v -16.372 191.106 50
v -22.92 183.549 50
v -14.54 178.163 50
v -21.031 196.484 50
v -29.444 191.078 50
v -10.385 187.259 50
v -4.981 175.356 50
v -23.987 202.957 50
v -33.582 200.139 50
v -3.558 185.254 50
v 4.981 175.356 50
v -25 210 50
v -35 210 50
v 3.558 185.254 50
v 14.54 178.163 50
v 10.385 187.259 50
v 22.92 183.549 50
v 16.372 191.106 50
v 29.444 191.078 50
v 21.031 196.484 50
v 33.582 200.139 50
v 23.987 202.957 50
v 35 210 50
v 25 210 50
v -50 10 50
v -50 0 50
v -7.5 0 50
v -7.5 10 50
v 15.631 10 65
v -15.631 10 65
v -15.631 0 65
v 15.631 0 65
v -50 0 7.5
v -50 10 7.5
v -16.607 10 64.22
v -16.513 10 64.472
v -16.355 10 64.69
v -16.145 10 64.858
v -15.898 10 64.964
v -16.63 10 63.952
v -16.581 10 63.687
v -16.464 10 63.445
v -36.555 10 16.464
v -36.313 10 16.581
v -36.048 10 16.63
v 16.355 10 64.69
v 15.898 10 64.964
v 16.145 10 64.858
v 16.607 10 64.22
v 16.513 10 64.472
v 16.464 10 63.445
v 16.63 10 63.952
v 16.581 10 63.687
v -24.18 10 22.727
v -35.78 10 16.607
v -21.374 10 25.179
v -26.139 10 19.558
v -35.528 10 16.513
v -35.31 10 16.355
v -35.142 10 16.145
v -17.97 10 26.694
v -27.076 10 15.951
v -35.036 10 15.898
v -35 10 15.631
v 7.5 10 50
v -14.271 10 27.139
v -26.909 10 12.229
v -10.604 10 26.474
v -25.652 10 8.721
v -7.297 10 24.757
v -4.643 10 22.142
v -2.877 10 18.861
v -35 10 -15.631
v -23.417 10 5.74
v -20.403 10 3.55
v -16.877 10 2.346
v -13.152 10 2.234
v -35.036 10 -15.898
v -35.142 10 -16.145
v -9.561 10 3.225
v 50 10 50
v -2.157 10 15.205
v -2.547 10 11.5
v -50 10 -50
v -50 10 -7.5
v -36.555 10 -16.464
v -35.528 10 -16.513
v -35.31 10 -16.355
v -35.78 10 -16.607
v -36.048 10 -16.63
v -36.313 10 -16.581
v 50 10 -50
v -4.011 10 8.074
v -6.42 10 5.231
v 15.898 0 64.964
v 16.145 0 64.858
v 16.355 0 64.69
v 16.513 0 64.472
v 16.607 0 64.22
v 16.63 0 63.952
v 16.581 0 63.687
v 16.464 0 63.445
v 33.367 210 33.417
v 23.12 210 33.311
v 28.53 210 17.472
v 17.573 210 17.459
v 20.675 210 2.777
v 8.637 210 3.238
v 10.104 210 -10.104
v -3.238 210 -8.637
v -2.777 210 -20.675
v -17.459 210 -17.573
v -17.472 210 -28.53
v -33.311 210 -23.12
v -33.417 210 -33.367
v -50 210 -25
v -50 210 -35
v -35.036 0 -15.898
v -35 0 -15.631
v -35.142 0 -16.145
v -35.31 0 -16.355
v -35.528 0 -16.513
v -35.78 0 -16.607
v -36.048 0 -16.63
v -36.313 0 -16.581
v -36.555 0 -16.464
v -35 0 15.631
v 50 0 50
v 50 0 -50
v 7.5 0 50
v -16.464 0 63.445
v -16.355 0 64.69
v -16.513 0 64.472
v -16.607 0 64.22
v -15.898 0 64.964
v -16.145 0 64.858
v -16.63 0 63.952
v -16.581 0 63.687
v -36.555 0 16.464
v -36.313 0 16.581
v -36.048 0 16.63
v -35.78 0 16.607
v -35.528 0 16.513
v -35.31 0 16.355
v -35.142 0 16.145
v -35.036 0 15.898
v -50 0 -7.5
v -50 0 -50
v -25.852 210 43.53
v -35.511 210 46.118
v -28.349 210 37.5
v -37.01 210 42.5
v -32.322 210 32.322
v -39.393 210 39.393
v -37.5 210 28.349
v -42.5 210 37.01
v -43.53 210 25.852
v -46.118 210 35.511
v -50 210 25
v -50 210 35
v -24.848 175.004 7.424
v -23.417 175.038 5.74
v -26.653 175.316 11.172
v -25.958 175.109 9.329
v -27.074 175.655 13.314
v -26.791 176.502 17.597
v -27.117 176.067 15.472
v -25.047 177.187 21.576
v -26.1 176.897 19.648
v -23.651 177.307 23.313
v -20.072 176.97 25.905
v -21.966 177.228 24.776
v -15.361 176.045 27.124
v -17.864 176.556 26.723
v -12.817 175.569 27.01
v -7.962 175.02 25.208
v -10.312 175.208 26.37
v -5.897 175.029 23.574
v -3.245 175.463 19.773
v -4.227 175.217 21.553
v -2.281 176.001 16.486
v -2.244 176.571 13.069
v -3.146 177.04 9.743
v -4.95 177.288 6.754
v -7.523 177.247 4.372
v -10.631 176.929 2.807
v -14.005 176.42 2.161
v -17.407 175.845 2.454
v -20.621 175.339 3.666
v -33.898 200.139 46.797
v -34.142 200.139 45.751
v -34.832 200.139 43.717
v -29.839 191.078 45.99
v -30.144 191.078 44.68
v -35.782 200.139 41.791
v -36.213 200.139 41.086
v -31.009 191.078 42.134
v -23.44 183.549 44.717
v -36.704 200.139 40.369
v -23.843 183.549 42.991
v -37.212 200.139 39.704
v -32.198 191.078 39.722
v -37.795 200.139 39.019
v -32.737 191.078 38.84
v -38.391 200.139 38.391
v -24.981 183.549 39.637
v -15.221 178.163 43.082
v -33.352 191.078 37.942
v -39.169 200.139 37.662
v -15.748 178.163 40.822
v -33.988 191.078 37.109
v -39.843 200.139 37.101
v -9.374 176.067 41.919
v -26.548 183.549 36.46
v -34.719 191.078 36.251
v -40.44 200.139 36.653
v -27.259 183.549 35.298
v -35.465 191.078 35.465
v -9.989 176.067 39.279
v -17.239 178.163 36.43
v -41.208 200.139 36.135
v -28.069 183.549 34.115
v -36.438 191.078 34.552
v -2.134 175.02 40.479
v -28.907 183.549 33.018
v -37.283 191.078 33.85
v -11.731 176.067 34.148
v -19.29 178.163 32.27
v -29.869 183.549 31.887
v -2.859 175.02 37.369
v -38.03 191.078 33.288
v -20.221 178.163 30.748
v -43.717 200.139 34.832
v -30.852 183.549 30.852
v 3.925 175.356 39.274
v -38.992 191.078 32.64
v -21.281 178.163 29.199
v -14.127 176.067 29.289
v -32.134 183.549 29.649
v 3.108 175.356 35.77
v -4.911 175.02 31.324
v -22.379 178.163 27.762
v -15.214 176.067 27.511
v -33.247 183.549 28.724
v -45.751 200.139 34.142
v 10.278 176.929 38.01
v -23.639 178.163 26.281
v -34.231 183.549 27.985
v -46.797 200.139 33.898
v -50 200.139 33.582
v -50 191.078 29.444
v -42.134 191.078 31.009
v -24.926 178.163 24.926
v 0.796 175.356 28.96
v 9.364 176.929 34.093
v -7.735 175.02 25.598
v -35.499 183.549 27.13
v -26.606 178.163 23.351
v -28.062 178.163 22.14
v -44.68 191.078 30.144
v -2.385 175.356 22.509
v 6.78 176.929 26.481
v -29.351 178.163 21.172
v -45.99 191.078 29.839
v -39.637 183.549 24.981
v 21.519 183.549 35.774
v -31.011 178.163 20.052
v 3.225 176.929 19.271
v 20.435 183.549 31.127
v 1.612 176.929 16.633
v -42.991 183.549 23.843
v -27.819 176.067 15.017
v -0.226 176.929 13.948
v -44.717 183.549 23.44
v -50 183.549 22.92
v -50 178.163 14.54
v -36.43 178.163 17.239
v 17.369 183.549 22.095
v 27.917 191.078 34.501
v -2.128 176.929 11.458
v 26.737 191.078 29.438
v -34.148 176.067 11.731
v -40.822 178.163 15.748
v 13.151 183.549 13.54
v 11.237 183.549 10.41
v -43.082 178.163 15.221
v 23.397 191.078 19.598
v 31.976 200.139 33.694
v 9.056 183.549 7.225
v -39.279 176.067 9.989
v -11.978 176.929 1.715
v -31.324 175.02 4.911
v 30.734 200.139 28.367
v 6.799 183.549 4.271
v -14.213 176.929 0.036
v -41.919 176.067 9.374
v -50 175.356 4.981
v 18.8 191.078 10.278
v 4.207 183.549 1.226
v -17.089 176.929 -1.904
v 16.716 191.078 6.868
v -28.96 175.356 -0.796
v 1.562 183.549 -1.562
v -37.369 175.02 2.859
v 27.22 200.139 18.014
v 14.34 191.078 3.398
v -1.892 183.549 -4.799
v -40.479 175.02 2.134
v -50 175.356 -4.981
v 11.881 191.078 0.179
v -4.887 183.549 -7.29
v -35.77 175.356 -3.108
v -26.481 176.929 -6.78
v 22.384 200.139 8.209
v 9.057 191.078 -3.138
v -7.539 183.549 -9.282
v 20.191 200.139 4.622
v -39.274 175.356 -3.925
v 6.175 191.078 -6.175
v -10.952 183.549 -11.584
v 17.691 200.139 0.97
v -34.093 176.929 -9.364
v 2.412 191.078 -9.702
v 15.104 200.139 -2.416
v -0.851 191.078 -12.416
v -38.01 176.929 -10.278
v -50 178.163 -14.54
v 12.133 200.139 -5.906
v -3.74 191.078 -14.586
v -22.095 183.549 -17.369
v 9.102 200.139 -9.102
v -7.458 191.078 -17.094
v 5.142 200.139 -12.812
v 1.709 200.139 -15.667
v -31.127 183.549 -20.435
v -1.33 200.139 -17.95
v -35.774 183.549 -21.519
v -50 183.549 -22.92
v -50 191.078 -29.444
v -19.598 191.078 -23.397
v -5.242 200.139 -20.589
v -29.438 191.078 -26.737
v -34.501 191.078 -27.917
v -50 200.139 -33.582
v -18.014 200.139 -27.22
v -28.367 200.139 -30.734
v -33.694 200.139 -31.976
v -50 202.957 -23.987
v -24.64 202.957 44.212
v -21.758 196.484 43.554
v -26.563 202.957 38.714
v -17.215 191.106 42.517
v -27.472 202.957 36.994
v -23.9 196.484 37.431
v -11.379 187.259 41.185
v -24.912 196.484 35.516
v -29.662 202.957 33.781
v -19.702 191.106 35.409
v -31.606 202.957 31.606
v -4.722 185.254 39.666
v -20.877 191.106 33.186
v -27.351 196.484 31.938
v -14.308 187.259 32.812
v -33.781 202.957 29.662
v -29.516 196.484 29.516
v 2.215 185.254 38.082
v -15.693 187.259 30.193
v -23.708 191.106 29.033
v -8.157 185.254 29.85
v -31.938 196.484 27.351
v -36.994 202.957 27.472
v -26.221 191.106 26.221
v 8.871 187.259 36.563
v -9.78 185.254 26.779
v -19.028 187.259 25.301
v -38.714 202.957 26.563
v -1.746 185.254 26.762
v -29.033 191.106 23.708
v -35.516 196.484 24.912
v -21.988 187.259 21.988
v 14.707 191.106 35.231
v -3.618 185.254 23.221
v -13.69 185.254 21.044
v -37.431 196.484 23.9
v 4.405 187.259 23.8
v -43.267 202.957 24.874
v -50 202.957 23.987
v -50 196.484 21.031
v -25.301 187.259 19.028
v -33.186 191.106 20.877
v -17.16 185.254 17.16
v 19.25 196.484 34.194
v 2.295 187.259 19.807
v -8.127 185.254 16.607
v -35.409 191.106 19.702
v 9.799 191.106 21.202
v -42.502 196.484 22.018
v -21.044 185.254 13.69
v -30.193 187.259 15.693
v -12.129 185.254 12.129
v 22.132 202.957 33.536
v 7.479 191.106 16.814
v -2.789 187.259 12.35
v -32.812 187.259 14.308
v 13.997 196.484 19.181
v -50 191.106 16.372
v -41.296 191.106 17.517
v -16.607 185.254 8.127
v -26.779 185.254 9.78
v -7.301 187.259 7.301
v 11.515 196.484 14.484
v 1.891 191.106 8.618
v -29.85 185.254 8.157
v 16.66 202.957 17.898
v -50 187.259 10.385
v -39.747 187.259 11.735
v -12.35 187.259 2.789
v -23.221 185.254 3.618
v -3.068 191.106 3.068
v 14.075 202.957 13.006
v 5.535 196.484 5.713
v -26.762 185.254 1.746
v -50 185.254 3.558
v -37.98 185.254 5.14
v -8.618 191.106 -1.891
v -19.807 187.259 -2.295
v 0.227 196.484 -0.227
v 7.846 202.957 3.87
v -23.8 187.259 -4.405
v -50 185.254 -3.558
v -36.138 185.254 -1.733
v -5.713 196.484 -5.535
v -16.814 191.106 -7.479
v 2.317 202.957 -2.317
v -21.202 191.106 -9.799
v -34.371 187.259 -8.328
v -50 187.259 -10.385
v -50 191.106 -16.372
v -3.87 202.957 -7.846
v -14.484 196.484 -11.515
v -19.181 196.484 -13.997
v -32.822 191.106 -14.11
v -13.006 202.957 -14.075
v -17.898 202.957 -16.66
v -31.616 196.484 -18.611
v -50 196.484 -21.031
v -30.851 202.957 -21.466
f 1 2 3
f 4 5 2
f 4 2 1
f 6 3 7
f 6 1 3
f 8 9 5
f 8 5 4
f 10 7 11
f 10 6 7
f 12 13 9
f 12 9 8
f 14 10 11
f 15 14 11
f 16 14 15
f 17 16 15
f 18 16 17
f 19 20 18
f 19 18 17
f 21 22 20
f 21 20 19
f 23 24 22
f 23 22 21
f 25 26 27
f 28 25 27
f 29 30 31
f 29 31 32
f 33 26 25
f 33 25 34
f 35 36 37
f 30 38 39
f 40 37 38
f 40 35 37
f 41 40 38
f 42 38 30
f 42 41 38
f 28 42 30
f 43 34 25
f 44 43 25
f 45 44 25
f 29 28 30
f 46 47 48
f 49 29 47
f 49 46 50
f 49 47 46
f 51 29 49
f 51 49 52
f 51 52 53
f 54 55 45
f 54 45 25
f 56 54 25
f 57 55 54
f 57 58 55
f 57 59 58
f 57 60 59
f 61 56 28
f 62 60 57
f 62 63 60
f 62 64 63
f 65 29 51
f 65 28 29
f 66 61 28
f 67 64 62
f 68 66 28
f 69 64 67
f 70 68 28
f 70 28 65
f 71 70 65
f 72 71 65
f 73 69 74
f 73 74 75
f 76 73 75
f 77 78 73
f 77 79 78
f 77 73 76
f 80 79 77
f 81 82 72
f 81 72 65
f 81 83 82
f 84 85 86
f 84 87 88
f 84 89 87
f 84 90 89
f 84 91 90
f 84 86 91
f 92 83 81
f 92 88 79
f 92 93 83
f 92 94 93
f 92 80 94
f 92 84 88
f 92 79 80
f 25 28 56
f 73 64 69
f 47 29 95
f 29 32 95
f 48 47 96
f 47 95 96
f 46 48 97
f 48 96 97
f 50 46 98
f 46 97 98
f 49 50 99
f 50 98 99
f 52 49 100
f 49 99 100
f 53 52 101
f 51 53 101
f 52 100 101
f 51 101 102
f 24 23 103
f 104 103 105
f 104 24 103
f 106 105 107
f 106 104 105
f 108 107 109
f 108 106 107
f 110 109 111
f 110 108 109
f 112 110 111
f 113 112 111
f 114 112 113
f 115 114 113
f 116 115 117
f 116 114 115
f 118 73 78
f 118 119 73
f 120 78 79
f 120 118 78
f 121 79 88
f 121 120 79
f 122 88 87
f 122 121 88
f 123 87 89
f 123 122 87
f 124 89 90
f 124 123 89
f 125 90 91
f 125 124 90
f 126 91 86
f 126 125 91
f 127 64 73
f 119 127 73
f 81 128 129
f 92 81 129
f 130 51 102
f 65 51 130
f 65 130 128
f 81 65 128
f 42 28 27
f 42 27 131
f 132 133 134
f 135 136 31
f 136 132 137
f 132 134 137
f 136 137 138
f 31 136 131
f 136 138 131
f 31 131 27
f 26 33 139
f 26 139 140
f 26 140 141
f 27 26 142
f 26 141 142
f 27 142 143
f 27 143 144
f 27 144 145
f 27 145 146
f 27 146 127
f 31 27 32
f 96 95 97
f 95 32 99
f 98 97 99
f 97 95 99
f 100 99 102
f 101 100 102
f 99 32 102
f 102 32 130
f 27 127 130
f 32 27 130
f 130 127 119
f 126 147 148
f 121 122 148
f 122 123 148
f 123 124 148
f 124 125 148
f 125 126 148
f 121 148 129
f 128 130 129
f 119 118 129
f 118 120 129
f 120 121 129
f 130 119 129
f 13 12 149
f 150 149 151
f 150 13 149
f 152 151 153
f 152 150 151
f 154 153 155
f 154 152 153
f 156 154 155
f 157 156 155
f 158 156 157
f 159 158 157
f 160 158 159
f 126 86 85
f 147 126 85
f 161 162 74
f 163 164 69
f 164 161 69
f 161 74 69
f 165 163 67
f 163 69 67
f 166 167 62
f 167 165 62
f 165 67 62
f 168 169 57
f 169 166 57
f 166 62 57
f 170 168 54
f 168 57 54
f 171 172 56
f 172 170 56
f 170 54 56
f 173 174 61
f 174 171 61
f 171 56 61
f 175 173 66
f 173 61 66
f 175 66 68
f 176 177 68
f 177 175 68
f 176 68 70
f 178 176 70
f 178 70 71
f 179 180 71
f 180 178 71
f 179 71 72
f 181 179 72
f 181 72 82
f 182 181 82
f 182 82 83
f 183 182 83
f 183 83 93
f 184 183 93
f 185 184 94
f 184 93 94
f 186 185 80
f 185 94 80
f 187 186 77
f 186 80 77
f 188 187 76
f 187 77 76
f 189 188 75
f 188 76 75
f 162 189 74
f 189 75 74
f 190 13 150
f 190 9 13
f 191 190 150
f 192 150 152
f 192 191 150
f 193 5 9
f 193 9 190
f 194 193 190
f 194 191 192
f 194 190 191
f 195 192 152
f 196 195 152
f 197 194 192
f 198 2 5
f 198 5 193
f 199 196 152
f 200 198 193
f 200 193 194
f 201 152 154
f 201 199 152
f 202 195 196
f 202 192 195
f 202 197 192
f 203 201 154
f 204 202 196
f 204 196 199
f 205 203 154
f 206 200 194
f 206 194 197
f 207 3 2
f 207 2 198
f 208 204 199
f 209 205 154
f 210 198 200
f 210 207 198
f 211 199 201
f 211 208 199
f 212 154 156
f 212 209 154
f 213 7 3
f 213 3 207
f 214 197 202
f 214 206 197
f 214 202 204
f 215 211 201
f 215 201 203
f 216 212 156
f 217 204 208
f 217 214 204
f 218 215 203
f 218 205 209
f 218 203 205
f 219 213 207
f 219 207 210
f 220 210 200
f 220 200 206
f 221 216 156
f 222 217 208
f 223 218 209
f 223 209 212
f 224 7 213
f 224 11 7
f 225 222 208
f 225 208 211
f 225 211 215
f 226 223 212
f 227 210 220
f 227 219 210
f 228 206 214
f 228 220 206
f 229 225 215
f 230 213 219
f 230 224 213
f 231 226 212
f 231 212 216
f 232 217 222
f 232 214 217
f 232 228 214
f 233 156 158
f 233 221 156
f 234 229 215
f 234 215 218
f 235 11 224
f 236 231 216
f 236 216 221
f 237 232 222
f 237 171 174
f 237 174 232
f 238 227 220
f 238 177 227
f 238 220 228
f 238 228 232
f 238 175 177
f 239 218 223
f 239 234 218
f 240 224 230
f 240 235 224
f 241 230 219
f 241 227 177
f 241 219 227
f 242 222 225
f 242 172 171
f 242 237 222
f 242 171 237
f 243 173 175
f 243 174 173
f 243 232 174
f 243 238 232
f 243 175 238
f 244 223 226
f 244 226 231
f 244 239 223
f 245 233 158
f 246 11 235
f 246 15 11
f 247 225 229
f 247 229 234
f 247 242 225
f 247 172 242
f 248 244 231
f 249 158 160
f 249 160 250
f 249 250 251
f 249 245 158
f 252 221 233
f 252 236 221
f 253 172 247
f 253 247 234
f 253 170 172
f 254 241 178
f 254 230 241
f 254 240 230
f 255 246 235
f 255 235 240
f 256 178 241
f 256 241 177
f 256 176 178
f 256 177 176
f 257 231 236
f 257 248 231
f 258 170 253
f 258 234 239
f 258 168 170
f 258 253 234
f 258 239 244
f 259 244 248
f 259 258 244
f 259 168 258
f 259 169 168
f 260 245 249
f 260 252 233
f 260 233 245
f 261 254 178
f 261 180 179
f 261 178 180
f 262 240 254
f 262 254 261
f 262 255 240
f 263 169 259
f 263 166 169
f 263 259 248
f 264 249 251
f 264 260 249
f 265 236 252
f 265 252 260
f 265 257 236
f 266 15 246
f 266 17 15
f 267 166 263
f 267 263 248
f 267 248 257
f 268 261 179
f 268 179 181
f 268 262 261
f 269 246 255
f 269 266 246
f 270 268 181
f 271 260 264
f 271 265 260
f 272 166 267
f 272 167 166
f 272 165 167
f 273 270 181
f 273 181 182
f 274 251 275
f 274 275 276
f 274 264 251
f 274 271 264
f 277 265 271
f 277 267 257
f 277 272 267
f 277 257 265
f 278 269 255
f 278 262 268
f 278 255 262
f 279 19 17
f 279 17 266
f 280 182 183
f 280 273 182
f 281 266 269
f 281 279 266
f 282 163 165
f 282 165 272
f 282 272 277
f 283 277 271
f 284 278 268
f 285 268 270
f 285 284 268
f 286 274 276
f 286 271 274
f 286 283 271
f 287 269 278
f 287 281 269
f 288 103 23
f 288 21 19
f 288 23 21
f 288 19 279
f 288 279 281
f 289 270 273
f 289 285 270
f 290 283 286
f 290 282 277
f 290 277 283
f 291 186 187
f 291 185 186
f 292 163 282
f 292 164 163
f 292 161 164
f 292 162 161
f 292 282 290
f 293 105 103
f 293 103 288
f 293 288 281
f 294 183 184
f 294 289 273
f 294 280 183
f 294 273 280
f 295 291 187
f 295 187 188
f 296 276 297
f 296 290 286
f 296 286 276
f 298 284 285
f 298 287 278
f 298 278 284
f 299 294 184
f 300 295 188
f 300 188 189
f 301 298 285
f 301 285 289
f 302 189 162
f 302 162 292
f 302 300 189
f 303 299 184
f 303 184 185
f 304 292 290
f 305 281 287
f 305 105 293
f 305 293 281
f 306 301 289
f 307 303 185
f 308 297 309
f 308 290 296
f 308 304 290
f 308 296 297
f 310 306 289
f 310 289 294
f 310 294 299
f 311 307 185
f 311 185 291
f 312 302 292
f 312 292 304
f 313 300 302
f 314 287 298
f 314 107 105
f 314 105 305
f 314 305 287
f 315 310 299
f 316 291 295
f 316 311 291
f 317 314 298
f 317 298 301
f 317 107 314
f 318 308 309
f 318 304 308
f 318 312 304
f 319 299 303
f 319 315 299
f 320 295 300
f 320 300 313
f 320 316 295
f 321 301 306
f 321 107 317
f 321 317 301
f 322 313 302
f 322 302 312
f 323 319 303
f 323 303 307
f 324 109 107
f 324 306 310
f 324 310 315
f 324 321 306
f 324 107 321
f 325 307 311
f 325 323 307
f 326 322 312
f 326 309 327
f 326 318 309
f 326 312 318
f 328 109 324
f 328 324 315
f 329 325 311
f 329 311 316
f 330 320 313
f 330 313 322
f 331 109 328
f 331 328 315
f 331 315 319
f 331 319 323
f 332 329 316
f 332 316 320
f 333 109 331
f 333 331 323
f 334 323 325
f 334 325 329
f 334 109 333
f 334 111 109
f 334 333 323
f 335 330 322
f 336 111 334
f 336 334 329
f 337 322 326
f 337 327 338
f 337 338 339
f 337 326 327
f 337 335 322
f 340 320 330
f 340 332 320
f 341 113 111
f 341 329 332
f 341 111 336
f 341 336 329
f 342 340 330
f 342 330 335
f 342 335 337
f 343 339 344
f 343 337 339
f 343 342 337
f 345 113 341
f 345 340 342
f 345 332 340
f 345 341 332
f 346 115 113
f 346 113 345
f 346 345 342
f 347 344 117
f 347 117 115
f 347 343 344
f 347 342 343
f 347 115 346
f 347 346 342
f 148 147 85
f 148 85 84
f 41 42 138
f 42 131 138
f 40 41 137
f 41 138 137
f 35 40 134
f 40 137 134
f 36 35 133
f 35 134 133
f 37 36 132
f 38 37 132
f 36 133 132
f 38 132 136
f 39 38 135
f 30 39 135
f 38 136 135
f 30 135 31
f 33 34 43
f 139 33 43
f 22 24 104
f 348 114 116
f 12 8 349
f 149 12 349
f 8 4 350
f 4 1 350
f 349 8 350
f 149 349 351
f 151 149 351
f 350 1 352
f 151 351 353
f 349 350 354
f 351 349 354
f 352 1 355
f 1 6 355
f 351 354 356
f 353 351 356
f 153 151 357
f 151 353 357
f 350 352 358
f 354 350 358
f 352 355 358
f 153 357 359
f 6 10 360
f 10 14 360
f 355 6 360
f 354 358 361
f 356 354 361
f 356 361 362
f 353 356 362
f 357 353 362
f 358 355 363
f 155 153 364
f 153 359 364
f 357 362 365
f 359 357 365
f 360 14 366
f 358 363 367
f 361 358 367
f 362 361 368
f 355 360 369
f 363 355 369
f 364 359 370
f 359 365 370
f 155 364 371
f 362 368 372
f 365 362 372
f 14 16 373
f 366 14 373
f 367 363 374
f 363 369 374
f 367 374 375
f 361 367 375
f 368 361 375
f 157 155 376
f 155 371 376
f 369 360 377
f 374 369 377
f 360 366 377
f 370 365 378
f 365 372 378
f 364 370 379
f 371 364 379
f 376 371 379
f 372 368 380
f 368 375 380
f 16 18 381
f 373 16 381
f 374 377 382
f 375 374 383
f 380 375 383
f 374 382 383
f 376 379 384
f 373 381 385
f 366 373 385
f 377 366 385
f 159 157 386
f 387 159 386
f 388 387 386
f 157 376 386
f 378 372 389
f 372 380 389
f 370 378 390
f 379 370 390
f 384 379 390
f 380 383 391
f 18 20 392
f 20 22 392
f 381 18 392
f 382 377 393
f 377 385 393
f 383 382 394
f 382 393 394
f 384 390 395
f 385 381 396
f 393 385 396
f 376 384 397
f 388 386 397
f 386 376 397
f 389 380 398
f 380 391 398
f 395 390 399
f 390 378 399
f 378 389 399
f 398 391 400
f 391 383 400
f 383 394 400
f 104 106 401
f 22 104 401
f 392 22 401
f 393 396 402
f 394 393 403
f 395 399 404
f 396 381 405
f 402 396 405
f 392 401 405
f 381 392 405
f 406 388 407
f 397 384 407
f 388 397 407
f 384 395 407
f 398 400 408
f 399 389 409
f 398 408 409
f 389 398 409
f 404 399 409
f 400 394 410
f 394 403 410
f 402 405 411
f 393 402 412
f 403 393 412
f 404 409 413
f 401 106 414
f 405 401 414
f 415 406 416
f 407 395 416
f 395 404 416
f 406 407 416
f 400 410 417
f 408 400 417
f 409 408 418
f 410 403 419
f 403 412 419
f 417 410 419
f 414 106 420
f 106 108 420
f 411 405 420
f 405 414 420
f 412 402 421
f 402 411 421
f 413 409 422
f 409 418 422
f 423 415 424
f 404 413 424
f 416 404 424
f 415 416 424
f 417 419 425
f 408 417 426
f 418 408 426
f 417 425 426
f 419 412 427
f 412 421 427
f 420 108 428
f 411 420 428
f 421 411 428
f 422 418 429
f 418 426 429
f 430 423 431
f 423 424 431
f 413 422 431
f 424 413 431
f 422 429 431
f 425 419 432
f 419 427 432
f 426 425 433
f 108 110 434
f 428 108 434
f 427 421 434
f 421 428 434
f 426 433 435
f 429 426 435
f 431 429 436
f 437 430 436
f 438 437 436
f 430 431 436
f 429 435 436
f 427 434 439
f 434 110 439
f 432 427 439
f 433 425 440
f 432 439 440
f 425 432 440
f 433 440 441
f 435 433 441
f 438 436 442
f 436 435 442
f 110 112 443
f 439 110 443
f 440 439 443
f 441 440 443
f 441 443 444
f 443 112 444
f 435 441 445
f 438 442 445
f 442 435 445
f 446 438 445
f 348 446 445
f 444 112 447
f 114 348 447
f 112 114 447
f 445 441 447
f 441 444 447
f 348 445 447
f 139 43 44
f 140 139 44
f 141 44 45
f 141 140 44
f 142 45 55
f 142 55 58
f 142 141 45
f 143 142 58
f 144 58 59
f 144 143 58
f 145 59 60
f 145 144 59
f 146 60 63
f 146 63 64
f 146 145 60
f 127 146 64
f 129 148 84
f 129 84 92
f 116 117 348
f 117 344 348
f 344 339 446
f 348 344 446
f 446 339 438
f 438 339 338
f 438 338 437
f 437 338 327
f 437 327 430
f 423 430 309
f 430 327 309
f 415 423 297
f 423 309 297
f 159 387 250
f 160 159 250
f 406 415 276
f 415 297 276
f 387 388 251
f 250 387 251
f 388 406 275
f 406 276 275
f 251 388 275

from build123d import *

# Parameters (mm, degrees)
SKETCH1_W                      = 100
SKETCH1_H                      = 100
BOSS_EXTRUDE1_DEPTH            = 10
BOSS_EXTRUDE2_REACH            = 214.132
BOSS_EXTRUDE2_END_MAJOR_RADIUS = 50
BOSS_EXTRUDE2_END_MINOR_RADIUS = 35
SKETCH4_R                      = 12.5
BOSS_EXTRUDE21_DEPTH           = 10
FILLET1_R                      = 1
CUT_EXTRUDE1_REACH             = 230.031
FILLET11_R                     = 1


with BuildPart() as part:
    # Sketch1 → Boss-Extrude1 (new body)
    with BuildSketch(Plane(origin=(0, 0, 0), x_dir=(1, 0, 0), z_dir=(0, 1, 0))):
        Rectangle(SKETCH1_W, SKETCH1_H)
    extrude(amount=BOSS_EXTRUDE1_DEPTH)



with BuildPart() as body_2:
    # Sweep1: sweep along a path in Sketch2
    with BuildLine(Plane(origin=(0, 210, 0), x_dir=(1, 0, 0), z_dir=(0, 1, 0))) as sweep1_path:
        ThreePointArc((0, -50), (-14.644660941, -14.644660941), (-50, 0))
    # Sketch3 → Sweep1 (sweep)
    with BuildSketch(Plane.XY.offset(50)):
        with BuildLine():
            Line((25, 210), (35, 210))
            ThreePointArc((35, 210), (0, 175), (-35, 210))
            Line((-35, 210), (-25, 210))
            ThreePointArc((-25, 210), (0, 185), (25, 210))
        make_face()
    sweep(path=sweep1_path.line)


with BuildPart() as part_1:
    add(part.part)

    add(body_2.part)  # Boss-Extrude2 merges body 2
    # Boss-Extrude2: up to this torus (the profile starts outside it)
    boss_extrude2_end = Plane(origin=(-50, 210, 50), z_dir=(0, 1, 0)) * Torus(BOSS_EXTRUDE2_END_MAJOR_RADIUS, BOSS_EXTRUDE2_END_MINOR_RADIUS, mode=Mode.PRIVATE)
    # Sketch4 → Boss-Extrude2 (add, up to the surface)
    with BuildSketch(Plane(origin=(0, 10, 0), x_dir=(1, 0, 0), z_dir=(0, 1, 0)), mode=Mode.PRIVATE) as boss_extrude2_sk1:
        with Locations(Location((-14.644660941, -14.644660941, 0), (0, 0, 134.571678601))):
            Circle(SKETCH4_R)
    boss_extrude2_tool1 = extrude(boss_extrude2_sk1.sketch, amount=BOSS_EXTRUDE2_REACH, mode=Mode.PRIVATE) - boss_extrude2_end
    add(boss_extrude2_tool1.solids().sort_by_distance((-14.644661, 10, 14.644661))[0])

    # Sketch21 → Boss-Extrude21 (add)
    with BuildSketch(Plane(origin=(14.233580657, 10, 36.500543766), x_dir=(1, 0, 0), z_dir=(0, 1, 0))):
        Polygon((-21.733580657, -13.499456234), (-31.733580657, -28.499456234), (3.266419343, -28.499456234), (-6.733580657, -13.499456234), align=None)
    extrude(amount=-BOSS_EXTRUDE21_DEPTH)

    # Fillet1
    fillet1_edges = [part_1.edges().sort_by_distance(p)[0] for p in [
        (-17.5, 5, 65),
        (17.5, 5, 65),
    ]]
    fillet(fillet1_edges, radius=FILLET1_R)

    # Sketch22 → Cut-Extrude1 (cut, up to next)
    with BuildSketch(Plane(origin=(-40.028558931, 10, 2.604903453), x_dir=(1, 0, 0), z_dir=(0, 1, 0)), mode=Mode.PRIVATE) as cut_extrude1_sk1:
        Polygon((-9.971441069, -4.895096547), (5.028558931, -14.895096547), (5.028558931, 20.104903453), (-9.971441069, 10.104903453), align=None)
    cut_extrude1_tool1 = extrude(cut_extrude1_sk1.sketch, amount=-CUT_EXTRUDE1_REACH, mode=Mode.PRIVATE) & part_1.part
    add(cut_extrude1_tool1.solids().sort_by_distance((-41.5, 10, 0))[0], mode=Mode.SUBTRACT)

    # Fillet11
    fillet11_edges = [part_1.edges().sort_by_distance(p)[0] for p in [
        (-35, 5, -17.5),
        (-35, 5, 17.5),
    ]]
    fillet(fillet11_edges, radius=FILLET11_R)


solid = part_1.part
